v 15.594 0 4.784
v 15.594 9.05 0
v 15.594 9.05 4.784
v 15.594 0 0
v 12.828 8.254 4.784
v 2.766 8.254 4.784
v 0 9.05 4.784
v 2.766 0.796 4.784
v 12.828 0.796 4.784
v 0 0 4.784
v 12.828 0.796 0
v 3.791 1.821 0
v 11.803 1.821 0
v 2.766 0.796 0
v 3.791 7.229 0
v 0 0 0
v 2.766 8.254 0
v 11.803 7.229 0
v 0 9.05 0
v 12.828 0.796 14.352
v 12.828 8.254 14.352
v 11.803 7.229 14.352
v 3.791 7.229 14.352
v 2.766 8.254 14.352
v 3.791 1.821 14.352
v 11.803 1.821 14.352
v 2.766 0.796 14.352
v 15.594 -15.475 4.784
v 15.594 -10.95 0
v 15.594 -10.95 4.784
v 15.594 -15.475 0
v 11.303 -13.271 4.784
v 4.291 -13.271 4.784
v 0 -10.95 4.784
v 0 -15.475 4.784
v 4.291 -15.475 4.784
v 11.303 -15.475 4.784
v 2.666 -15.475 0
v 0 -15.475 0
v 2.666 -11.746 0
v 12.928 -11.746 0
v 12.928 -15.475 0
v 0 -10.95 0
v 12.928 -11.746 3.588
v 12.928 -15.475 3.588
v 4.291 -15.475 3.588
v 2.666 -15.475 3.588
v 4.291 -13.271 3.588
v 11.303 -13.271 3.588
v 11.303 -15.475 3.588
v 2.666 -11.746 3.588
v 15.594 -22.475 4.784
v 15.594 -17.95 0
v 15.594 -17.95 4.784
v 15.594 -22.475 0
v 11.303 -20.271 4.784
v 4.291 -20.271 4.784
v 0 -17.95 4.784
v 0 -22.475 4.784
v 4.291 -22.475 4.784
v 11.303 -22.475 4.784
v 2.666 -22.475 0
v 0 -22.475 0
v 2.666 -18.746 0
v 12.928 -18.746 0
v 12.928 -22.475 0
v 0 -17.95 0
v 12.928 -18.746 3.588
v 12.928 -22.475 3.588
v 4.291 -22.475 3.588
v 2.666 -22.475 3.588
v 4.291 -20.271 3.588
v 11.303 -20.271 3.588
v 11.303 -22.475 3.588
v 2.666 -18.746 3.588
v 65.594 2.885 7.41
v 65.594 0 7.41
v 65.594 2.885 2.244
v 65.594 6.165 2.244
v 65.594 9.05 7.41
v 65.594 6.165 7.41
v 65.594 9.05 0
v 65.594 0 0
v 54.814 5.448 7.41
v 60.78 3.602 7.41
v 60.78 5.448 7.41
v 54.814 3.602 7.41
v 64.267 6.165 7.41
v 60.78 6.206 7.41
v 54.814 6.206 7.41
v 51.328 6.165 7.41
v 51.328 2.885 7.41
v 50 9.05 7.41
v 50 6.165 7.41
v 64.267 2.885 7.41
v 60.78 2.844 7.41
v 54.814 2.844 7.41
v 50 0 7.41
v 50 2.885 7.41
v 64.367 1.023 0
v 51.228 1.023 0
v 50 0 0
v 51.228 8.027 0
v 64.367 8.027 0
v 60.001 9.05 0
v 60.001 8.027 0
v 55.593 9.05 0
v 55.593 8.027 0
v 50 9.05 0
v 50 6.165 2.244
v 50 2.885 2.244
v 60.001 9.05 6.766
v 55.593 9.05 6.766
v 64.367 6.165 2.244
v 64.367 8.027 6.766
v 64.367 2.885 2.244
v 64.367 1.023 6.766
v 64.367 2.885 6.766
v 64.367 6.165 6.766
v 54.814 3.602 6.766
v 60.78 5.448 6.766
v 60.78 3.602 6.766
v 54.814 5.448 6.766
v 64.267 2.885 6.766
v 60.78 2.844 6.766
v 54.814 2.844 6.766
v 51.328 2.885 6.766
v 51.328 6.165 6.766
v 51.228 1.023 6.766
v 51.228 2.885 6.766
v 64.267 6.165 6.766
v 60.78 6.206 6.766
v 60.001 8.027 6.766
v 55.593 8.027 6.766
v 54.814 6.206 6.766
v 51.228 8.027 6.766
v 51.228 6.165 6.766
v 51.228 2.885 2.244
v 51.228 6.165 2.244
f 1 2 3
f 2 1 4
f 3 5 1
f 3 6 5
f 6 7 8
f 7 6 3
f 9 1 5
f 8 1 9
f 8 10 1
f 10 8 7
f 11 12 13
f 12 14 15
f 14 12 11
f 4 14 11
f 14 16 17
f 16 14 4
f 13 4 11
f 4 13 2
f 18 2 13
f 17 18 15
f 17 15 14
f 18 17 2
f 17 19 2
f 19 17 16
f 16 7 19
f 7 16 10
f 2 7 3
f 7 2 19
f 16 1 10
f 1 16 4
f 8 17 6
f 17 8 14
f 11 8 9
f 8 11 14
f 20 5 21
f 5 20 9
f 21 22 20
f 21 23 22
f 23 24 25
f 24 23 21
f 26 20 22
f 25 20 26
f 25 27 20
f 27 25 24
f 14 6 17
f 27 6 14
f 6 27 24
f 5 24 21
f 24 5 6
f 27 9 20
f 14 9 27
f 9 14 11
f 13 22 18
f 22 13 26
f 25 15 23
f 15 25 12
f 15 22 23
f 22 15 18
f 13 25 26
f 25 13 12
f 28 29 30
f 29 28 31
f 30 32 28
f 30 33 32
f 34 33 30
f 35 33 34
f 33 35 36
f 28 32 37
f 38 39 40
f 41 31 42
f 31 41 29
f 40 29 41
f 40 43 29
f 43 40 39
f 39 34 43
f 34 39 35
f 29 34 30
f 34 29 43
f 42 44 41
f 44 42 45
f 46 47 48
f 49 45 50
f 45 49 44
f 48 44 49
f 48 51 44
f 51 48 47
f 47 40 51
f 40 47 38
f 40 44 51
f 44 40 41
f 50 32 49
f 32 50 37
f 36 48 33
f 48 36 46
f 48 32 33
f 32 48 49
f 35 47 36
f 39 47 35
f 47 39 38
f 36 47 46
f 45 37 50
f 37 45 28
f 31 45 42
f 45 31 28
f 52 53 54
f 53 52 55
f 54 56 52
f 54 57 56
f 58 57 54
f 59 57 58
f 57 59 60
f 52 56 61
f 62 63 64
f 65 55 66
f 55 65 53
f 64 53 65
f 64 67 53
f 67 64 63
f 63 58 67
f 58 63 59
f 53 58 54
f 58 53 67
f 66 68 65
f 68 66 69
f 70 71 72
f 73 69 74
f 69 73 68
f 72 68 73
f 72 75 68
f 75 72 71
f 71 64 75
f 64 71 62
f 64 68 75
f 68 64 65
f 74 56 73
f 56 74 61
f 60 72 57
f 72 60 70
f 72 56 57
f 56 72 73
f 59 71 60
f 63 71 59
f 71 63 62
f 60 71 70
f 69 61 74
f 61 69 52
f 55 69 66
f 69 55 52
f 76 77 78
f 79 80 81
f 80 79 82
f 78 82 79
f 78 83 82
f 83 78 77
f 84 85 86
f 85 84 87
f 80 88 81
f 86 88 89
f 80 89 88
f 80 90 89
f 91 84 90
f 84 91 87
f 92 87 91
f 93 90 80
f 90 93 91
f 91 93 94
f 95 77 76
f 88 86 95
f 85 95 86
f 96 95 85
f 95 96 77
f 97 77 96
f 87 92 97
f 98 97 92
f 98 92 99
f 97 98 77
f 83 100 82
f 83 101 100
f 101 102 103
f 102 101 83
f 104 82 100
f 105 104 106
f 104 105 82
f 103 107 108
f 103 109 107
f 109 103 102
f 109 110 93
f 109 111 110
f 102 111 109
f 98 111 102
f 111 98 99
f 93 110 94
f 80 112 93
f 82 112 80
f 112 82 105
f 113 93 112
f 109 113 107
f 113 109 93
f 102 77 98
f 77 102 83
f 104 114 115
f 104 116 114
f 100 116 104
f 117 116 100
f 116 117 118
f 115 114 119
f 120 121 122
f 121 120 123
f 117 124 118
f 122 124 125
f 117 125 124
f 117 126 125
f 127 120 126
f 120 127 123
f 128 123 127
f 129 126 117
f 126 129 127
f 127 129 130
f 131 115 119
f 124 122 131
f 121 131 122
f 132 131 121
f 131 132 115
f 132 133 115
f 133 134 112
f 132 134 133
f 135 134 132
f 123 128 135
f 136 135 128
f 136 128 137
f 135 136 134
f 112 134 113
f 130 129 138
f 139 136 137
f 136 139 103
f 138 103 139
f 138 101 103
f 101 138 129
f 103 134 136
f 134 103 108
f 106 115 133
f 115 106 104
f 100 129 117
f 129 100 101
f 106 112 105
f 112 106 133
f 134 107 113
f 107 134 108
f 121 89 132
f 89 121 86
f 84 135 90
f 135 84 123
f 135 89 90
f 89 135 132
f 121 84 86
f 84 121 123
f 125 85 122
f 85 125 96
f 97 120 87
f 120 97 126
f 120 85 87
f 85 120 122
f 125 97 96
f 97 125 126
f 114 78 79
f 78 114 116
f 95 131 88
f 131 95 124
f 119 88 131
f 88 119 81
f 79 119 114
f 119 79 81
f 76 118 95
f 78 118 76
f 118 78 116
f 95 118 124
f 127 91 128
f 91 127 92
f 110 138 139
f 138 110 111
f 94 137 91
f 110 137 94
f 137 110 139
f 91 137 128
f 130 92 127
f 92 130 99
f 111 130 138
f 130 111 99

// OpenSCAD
//杜邦線轉成IDC母頭

sc=15.9/16.3; //尺寸校準,依照自己印表機調整, 為 實際/設定值 的比例, 取得的值拿來除

//針數
pinR=2;
pinC=3;

//dupont jumpers 外殼尺寸, 長寬都2.54, 高14mm
djSize=2.54 / sc;
djH=14 / sc;
djT=0.5 / sc;
//頂針於IDC底部遮蔽的厚度
djT2=0.9 / sc;

djHolder_T=2 / sc;
djHolder_W_In = djSize*pinC+0.2;
djHolder_L_In = djSize*pinR+0.2;
djHolder_W_Out=djHolder_W_In+djHolder_T;
djHolder_L_Out=djHolder_L_In+djHolder_T;



//尾部長度 開孔長寬
djHt=djH/3;
djHolderT_W_In = djHolder_W_In-(0.5*2);
djHolderT_L_In = djHolder_L_In-(0.5*2);

//長寬 外殼厚度
IDC_W_t=1.1 / sc;
IDC_L_t=0.9 / sc;

//外部大小
//IDC_W_Out=32.8 / sc;
//IDC_L_Out=8.7 / sc;
//IDC_H_Out=8.7 -1.6 / sc;
IDC_W_Out=(7.4+djSize*pinC) / sc;
IDC_L_Out=(3.62+djSize*pinR) / sc;
IDC_H_Out=((3.62+djSize*pinR) -1.6) / sc;

//內部空間大小
IDC_W_In=IDC_W_Out-IDC_W_t*2-0.2;
IDC_L_In=IDC_L_Out-IDC_L_t*2-0.2;
IDC_W_S=IDC_W_In-djSize*pinC;
IDC_L_S=IDC_L_In-djSize*pinR;
IDC_H_In=6.6 / sc;

top_side_cut_size=4.3 / sc;
both_side_cut_size=3.2 / sc;

IDC_Bt_Cut_W=djSize*pinC-djT2*2;
IDC_Bt_Cut_L=djSize*1-djT2*2;


module Male_idc(borders=[0,0,0,0]) {
    
difference() {
cube([IDC_W_Out,IDC_L_Out,IDC_H_Out]);
    //內部空洞
    translate([(IDC_W_Out-IDC_W_In)/2,(IDC_L_Out-IDC_L_In)/2,0]) 
        cube([IDC_W_In,IDC_L_In,IDC_H_In]);
    //頂部定位缺孔
    translate([(IDC_W_Out-top_side_cut_size)/2,IDC_L_Out-IDC_L_t-0.2,0]) 
        cube([top_side_cut_size,IDC_L_t+0.2,IDC_H_In]);
    //底部開孔
    translate([(IDC_W_Out-IDC_Bt_Cut_W)/2,(IDC_L_Out-IDC_Bt_Cut_L)/2+djSize/2,IDC_H_In]) 
        cube([IDC_Bt_Cut_W,IDC_Bt_Cut_L,djH]);
    translate([(IDC_W_Out-IDC_Bt_Cut_W)/2,(IDC_L_Out-IDC_Bt_Cut_L)/2-djSize/2,IDC_H_In]) 
        cube([IDC_Bt_Cut_W,IDC_Bt_Cut_L,djH]);
    //側面開孔
    translate([IDC_W_Out-IDC_W_t-0.2,(IDC_L_Out-both_side_cut_size)/2,IDC_H_Out-IDC_H_In+1.6]) 
        #cube([IDC_W_t+0.2,both_side_cut_size,IDC_H_In-1.6]);
    translate([0,(IDC_L_Out-both_side_cut_size)/2,IDC_H_Out-IDC_H_In+1.6]) 
        #cube([IDC_W_t+0.2,both_side_cut_size,IDC_H_In-1.6]);    
    }
    
}


module DJ_Holder(borders=[0,0,0,0]) {
difference() {
cube([IDC_W_Out,IDC_L_Out,djH/3]);
    translate([(IDC_W_Out-djHolder_W_Out)/2,(IDC_L_Out-djHolder_L_Out)/2,0]) 
    cube([djHolder_W_Out,djHolder_L_Out,djH]);
}

translate([(IDC_W_Out-djHolder_W_Out)/2,(IDC_L_Out-djHolder_L_Out)/2,0])
difference() {
cube([djHolder_W_Out,djHolder_L_Out,djH]);
    //內部空洞
    translate([(djHolder_W_Out-djHolder_W_In)/2,(djHolder_L_Out-djHolder_L_In)/2,0]) 
        cube([djHolder_W_In,djHolder_L_In,djH]);
}
}

module DJ_HolderTail(borders=[0,0,0,0]) {
difference() {
cube([IDC_W_Out,IDC_L_Out,djH/3]);
translate([(IDC_W_Out-djHolder_W_Out-0.2)/2,(IDC_L_Out-djHolder_L_Out)/2,0]) 
    #cube([djHolder_W_Out+0.2,djHolder_L_Out,djH/4]);
translate([(IDC_W_Out-djHolderT_W_In)/2,(IDC_L_Out-djHolderT_L_In)/2,0]) 
        cube([djHolderT_W_In,djHolderT_L_In,djH]);
//切一半用來夾住
cube([IDC_W_Out,IDC_L_Out/2,djH/3]);

}   

    
}


translate([0,0,0])
    DJ_Holder();

translate([0,-20,0])
    DJ_HolderTail();

translate([0,-27,0])
    DJ_HolderTail();

translate([50,0,0])
    Male_idc(); 
